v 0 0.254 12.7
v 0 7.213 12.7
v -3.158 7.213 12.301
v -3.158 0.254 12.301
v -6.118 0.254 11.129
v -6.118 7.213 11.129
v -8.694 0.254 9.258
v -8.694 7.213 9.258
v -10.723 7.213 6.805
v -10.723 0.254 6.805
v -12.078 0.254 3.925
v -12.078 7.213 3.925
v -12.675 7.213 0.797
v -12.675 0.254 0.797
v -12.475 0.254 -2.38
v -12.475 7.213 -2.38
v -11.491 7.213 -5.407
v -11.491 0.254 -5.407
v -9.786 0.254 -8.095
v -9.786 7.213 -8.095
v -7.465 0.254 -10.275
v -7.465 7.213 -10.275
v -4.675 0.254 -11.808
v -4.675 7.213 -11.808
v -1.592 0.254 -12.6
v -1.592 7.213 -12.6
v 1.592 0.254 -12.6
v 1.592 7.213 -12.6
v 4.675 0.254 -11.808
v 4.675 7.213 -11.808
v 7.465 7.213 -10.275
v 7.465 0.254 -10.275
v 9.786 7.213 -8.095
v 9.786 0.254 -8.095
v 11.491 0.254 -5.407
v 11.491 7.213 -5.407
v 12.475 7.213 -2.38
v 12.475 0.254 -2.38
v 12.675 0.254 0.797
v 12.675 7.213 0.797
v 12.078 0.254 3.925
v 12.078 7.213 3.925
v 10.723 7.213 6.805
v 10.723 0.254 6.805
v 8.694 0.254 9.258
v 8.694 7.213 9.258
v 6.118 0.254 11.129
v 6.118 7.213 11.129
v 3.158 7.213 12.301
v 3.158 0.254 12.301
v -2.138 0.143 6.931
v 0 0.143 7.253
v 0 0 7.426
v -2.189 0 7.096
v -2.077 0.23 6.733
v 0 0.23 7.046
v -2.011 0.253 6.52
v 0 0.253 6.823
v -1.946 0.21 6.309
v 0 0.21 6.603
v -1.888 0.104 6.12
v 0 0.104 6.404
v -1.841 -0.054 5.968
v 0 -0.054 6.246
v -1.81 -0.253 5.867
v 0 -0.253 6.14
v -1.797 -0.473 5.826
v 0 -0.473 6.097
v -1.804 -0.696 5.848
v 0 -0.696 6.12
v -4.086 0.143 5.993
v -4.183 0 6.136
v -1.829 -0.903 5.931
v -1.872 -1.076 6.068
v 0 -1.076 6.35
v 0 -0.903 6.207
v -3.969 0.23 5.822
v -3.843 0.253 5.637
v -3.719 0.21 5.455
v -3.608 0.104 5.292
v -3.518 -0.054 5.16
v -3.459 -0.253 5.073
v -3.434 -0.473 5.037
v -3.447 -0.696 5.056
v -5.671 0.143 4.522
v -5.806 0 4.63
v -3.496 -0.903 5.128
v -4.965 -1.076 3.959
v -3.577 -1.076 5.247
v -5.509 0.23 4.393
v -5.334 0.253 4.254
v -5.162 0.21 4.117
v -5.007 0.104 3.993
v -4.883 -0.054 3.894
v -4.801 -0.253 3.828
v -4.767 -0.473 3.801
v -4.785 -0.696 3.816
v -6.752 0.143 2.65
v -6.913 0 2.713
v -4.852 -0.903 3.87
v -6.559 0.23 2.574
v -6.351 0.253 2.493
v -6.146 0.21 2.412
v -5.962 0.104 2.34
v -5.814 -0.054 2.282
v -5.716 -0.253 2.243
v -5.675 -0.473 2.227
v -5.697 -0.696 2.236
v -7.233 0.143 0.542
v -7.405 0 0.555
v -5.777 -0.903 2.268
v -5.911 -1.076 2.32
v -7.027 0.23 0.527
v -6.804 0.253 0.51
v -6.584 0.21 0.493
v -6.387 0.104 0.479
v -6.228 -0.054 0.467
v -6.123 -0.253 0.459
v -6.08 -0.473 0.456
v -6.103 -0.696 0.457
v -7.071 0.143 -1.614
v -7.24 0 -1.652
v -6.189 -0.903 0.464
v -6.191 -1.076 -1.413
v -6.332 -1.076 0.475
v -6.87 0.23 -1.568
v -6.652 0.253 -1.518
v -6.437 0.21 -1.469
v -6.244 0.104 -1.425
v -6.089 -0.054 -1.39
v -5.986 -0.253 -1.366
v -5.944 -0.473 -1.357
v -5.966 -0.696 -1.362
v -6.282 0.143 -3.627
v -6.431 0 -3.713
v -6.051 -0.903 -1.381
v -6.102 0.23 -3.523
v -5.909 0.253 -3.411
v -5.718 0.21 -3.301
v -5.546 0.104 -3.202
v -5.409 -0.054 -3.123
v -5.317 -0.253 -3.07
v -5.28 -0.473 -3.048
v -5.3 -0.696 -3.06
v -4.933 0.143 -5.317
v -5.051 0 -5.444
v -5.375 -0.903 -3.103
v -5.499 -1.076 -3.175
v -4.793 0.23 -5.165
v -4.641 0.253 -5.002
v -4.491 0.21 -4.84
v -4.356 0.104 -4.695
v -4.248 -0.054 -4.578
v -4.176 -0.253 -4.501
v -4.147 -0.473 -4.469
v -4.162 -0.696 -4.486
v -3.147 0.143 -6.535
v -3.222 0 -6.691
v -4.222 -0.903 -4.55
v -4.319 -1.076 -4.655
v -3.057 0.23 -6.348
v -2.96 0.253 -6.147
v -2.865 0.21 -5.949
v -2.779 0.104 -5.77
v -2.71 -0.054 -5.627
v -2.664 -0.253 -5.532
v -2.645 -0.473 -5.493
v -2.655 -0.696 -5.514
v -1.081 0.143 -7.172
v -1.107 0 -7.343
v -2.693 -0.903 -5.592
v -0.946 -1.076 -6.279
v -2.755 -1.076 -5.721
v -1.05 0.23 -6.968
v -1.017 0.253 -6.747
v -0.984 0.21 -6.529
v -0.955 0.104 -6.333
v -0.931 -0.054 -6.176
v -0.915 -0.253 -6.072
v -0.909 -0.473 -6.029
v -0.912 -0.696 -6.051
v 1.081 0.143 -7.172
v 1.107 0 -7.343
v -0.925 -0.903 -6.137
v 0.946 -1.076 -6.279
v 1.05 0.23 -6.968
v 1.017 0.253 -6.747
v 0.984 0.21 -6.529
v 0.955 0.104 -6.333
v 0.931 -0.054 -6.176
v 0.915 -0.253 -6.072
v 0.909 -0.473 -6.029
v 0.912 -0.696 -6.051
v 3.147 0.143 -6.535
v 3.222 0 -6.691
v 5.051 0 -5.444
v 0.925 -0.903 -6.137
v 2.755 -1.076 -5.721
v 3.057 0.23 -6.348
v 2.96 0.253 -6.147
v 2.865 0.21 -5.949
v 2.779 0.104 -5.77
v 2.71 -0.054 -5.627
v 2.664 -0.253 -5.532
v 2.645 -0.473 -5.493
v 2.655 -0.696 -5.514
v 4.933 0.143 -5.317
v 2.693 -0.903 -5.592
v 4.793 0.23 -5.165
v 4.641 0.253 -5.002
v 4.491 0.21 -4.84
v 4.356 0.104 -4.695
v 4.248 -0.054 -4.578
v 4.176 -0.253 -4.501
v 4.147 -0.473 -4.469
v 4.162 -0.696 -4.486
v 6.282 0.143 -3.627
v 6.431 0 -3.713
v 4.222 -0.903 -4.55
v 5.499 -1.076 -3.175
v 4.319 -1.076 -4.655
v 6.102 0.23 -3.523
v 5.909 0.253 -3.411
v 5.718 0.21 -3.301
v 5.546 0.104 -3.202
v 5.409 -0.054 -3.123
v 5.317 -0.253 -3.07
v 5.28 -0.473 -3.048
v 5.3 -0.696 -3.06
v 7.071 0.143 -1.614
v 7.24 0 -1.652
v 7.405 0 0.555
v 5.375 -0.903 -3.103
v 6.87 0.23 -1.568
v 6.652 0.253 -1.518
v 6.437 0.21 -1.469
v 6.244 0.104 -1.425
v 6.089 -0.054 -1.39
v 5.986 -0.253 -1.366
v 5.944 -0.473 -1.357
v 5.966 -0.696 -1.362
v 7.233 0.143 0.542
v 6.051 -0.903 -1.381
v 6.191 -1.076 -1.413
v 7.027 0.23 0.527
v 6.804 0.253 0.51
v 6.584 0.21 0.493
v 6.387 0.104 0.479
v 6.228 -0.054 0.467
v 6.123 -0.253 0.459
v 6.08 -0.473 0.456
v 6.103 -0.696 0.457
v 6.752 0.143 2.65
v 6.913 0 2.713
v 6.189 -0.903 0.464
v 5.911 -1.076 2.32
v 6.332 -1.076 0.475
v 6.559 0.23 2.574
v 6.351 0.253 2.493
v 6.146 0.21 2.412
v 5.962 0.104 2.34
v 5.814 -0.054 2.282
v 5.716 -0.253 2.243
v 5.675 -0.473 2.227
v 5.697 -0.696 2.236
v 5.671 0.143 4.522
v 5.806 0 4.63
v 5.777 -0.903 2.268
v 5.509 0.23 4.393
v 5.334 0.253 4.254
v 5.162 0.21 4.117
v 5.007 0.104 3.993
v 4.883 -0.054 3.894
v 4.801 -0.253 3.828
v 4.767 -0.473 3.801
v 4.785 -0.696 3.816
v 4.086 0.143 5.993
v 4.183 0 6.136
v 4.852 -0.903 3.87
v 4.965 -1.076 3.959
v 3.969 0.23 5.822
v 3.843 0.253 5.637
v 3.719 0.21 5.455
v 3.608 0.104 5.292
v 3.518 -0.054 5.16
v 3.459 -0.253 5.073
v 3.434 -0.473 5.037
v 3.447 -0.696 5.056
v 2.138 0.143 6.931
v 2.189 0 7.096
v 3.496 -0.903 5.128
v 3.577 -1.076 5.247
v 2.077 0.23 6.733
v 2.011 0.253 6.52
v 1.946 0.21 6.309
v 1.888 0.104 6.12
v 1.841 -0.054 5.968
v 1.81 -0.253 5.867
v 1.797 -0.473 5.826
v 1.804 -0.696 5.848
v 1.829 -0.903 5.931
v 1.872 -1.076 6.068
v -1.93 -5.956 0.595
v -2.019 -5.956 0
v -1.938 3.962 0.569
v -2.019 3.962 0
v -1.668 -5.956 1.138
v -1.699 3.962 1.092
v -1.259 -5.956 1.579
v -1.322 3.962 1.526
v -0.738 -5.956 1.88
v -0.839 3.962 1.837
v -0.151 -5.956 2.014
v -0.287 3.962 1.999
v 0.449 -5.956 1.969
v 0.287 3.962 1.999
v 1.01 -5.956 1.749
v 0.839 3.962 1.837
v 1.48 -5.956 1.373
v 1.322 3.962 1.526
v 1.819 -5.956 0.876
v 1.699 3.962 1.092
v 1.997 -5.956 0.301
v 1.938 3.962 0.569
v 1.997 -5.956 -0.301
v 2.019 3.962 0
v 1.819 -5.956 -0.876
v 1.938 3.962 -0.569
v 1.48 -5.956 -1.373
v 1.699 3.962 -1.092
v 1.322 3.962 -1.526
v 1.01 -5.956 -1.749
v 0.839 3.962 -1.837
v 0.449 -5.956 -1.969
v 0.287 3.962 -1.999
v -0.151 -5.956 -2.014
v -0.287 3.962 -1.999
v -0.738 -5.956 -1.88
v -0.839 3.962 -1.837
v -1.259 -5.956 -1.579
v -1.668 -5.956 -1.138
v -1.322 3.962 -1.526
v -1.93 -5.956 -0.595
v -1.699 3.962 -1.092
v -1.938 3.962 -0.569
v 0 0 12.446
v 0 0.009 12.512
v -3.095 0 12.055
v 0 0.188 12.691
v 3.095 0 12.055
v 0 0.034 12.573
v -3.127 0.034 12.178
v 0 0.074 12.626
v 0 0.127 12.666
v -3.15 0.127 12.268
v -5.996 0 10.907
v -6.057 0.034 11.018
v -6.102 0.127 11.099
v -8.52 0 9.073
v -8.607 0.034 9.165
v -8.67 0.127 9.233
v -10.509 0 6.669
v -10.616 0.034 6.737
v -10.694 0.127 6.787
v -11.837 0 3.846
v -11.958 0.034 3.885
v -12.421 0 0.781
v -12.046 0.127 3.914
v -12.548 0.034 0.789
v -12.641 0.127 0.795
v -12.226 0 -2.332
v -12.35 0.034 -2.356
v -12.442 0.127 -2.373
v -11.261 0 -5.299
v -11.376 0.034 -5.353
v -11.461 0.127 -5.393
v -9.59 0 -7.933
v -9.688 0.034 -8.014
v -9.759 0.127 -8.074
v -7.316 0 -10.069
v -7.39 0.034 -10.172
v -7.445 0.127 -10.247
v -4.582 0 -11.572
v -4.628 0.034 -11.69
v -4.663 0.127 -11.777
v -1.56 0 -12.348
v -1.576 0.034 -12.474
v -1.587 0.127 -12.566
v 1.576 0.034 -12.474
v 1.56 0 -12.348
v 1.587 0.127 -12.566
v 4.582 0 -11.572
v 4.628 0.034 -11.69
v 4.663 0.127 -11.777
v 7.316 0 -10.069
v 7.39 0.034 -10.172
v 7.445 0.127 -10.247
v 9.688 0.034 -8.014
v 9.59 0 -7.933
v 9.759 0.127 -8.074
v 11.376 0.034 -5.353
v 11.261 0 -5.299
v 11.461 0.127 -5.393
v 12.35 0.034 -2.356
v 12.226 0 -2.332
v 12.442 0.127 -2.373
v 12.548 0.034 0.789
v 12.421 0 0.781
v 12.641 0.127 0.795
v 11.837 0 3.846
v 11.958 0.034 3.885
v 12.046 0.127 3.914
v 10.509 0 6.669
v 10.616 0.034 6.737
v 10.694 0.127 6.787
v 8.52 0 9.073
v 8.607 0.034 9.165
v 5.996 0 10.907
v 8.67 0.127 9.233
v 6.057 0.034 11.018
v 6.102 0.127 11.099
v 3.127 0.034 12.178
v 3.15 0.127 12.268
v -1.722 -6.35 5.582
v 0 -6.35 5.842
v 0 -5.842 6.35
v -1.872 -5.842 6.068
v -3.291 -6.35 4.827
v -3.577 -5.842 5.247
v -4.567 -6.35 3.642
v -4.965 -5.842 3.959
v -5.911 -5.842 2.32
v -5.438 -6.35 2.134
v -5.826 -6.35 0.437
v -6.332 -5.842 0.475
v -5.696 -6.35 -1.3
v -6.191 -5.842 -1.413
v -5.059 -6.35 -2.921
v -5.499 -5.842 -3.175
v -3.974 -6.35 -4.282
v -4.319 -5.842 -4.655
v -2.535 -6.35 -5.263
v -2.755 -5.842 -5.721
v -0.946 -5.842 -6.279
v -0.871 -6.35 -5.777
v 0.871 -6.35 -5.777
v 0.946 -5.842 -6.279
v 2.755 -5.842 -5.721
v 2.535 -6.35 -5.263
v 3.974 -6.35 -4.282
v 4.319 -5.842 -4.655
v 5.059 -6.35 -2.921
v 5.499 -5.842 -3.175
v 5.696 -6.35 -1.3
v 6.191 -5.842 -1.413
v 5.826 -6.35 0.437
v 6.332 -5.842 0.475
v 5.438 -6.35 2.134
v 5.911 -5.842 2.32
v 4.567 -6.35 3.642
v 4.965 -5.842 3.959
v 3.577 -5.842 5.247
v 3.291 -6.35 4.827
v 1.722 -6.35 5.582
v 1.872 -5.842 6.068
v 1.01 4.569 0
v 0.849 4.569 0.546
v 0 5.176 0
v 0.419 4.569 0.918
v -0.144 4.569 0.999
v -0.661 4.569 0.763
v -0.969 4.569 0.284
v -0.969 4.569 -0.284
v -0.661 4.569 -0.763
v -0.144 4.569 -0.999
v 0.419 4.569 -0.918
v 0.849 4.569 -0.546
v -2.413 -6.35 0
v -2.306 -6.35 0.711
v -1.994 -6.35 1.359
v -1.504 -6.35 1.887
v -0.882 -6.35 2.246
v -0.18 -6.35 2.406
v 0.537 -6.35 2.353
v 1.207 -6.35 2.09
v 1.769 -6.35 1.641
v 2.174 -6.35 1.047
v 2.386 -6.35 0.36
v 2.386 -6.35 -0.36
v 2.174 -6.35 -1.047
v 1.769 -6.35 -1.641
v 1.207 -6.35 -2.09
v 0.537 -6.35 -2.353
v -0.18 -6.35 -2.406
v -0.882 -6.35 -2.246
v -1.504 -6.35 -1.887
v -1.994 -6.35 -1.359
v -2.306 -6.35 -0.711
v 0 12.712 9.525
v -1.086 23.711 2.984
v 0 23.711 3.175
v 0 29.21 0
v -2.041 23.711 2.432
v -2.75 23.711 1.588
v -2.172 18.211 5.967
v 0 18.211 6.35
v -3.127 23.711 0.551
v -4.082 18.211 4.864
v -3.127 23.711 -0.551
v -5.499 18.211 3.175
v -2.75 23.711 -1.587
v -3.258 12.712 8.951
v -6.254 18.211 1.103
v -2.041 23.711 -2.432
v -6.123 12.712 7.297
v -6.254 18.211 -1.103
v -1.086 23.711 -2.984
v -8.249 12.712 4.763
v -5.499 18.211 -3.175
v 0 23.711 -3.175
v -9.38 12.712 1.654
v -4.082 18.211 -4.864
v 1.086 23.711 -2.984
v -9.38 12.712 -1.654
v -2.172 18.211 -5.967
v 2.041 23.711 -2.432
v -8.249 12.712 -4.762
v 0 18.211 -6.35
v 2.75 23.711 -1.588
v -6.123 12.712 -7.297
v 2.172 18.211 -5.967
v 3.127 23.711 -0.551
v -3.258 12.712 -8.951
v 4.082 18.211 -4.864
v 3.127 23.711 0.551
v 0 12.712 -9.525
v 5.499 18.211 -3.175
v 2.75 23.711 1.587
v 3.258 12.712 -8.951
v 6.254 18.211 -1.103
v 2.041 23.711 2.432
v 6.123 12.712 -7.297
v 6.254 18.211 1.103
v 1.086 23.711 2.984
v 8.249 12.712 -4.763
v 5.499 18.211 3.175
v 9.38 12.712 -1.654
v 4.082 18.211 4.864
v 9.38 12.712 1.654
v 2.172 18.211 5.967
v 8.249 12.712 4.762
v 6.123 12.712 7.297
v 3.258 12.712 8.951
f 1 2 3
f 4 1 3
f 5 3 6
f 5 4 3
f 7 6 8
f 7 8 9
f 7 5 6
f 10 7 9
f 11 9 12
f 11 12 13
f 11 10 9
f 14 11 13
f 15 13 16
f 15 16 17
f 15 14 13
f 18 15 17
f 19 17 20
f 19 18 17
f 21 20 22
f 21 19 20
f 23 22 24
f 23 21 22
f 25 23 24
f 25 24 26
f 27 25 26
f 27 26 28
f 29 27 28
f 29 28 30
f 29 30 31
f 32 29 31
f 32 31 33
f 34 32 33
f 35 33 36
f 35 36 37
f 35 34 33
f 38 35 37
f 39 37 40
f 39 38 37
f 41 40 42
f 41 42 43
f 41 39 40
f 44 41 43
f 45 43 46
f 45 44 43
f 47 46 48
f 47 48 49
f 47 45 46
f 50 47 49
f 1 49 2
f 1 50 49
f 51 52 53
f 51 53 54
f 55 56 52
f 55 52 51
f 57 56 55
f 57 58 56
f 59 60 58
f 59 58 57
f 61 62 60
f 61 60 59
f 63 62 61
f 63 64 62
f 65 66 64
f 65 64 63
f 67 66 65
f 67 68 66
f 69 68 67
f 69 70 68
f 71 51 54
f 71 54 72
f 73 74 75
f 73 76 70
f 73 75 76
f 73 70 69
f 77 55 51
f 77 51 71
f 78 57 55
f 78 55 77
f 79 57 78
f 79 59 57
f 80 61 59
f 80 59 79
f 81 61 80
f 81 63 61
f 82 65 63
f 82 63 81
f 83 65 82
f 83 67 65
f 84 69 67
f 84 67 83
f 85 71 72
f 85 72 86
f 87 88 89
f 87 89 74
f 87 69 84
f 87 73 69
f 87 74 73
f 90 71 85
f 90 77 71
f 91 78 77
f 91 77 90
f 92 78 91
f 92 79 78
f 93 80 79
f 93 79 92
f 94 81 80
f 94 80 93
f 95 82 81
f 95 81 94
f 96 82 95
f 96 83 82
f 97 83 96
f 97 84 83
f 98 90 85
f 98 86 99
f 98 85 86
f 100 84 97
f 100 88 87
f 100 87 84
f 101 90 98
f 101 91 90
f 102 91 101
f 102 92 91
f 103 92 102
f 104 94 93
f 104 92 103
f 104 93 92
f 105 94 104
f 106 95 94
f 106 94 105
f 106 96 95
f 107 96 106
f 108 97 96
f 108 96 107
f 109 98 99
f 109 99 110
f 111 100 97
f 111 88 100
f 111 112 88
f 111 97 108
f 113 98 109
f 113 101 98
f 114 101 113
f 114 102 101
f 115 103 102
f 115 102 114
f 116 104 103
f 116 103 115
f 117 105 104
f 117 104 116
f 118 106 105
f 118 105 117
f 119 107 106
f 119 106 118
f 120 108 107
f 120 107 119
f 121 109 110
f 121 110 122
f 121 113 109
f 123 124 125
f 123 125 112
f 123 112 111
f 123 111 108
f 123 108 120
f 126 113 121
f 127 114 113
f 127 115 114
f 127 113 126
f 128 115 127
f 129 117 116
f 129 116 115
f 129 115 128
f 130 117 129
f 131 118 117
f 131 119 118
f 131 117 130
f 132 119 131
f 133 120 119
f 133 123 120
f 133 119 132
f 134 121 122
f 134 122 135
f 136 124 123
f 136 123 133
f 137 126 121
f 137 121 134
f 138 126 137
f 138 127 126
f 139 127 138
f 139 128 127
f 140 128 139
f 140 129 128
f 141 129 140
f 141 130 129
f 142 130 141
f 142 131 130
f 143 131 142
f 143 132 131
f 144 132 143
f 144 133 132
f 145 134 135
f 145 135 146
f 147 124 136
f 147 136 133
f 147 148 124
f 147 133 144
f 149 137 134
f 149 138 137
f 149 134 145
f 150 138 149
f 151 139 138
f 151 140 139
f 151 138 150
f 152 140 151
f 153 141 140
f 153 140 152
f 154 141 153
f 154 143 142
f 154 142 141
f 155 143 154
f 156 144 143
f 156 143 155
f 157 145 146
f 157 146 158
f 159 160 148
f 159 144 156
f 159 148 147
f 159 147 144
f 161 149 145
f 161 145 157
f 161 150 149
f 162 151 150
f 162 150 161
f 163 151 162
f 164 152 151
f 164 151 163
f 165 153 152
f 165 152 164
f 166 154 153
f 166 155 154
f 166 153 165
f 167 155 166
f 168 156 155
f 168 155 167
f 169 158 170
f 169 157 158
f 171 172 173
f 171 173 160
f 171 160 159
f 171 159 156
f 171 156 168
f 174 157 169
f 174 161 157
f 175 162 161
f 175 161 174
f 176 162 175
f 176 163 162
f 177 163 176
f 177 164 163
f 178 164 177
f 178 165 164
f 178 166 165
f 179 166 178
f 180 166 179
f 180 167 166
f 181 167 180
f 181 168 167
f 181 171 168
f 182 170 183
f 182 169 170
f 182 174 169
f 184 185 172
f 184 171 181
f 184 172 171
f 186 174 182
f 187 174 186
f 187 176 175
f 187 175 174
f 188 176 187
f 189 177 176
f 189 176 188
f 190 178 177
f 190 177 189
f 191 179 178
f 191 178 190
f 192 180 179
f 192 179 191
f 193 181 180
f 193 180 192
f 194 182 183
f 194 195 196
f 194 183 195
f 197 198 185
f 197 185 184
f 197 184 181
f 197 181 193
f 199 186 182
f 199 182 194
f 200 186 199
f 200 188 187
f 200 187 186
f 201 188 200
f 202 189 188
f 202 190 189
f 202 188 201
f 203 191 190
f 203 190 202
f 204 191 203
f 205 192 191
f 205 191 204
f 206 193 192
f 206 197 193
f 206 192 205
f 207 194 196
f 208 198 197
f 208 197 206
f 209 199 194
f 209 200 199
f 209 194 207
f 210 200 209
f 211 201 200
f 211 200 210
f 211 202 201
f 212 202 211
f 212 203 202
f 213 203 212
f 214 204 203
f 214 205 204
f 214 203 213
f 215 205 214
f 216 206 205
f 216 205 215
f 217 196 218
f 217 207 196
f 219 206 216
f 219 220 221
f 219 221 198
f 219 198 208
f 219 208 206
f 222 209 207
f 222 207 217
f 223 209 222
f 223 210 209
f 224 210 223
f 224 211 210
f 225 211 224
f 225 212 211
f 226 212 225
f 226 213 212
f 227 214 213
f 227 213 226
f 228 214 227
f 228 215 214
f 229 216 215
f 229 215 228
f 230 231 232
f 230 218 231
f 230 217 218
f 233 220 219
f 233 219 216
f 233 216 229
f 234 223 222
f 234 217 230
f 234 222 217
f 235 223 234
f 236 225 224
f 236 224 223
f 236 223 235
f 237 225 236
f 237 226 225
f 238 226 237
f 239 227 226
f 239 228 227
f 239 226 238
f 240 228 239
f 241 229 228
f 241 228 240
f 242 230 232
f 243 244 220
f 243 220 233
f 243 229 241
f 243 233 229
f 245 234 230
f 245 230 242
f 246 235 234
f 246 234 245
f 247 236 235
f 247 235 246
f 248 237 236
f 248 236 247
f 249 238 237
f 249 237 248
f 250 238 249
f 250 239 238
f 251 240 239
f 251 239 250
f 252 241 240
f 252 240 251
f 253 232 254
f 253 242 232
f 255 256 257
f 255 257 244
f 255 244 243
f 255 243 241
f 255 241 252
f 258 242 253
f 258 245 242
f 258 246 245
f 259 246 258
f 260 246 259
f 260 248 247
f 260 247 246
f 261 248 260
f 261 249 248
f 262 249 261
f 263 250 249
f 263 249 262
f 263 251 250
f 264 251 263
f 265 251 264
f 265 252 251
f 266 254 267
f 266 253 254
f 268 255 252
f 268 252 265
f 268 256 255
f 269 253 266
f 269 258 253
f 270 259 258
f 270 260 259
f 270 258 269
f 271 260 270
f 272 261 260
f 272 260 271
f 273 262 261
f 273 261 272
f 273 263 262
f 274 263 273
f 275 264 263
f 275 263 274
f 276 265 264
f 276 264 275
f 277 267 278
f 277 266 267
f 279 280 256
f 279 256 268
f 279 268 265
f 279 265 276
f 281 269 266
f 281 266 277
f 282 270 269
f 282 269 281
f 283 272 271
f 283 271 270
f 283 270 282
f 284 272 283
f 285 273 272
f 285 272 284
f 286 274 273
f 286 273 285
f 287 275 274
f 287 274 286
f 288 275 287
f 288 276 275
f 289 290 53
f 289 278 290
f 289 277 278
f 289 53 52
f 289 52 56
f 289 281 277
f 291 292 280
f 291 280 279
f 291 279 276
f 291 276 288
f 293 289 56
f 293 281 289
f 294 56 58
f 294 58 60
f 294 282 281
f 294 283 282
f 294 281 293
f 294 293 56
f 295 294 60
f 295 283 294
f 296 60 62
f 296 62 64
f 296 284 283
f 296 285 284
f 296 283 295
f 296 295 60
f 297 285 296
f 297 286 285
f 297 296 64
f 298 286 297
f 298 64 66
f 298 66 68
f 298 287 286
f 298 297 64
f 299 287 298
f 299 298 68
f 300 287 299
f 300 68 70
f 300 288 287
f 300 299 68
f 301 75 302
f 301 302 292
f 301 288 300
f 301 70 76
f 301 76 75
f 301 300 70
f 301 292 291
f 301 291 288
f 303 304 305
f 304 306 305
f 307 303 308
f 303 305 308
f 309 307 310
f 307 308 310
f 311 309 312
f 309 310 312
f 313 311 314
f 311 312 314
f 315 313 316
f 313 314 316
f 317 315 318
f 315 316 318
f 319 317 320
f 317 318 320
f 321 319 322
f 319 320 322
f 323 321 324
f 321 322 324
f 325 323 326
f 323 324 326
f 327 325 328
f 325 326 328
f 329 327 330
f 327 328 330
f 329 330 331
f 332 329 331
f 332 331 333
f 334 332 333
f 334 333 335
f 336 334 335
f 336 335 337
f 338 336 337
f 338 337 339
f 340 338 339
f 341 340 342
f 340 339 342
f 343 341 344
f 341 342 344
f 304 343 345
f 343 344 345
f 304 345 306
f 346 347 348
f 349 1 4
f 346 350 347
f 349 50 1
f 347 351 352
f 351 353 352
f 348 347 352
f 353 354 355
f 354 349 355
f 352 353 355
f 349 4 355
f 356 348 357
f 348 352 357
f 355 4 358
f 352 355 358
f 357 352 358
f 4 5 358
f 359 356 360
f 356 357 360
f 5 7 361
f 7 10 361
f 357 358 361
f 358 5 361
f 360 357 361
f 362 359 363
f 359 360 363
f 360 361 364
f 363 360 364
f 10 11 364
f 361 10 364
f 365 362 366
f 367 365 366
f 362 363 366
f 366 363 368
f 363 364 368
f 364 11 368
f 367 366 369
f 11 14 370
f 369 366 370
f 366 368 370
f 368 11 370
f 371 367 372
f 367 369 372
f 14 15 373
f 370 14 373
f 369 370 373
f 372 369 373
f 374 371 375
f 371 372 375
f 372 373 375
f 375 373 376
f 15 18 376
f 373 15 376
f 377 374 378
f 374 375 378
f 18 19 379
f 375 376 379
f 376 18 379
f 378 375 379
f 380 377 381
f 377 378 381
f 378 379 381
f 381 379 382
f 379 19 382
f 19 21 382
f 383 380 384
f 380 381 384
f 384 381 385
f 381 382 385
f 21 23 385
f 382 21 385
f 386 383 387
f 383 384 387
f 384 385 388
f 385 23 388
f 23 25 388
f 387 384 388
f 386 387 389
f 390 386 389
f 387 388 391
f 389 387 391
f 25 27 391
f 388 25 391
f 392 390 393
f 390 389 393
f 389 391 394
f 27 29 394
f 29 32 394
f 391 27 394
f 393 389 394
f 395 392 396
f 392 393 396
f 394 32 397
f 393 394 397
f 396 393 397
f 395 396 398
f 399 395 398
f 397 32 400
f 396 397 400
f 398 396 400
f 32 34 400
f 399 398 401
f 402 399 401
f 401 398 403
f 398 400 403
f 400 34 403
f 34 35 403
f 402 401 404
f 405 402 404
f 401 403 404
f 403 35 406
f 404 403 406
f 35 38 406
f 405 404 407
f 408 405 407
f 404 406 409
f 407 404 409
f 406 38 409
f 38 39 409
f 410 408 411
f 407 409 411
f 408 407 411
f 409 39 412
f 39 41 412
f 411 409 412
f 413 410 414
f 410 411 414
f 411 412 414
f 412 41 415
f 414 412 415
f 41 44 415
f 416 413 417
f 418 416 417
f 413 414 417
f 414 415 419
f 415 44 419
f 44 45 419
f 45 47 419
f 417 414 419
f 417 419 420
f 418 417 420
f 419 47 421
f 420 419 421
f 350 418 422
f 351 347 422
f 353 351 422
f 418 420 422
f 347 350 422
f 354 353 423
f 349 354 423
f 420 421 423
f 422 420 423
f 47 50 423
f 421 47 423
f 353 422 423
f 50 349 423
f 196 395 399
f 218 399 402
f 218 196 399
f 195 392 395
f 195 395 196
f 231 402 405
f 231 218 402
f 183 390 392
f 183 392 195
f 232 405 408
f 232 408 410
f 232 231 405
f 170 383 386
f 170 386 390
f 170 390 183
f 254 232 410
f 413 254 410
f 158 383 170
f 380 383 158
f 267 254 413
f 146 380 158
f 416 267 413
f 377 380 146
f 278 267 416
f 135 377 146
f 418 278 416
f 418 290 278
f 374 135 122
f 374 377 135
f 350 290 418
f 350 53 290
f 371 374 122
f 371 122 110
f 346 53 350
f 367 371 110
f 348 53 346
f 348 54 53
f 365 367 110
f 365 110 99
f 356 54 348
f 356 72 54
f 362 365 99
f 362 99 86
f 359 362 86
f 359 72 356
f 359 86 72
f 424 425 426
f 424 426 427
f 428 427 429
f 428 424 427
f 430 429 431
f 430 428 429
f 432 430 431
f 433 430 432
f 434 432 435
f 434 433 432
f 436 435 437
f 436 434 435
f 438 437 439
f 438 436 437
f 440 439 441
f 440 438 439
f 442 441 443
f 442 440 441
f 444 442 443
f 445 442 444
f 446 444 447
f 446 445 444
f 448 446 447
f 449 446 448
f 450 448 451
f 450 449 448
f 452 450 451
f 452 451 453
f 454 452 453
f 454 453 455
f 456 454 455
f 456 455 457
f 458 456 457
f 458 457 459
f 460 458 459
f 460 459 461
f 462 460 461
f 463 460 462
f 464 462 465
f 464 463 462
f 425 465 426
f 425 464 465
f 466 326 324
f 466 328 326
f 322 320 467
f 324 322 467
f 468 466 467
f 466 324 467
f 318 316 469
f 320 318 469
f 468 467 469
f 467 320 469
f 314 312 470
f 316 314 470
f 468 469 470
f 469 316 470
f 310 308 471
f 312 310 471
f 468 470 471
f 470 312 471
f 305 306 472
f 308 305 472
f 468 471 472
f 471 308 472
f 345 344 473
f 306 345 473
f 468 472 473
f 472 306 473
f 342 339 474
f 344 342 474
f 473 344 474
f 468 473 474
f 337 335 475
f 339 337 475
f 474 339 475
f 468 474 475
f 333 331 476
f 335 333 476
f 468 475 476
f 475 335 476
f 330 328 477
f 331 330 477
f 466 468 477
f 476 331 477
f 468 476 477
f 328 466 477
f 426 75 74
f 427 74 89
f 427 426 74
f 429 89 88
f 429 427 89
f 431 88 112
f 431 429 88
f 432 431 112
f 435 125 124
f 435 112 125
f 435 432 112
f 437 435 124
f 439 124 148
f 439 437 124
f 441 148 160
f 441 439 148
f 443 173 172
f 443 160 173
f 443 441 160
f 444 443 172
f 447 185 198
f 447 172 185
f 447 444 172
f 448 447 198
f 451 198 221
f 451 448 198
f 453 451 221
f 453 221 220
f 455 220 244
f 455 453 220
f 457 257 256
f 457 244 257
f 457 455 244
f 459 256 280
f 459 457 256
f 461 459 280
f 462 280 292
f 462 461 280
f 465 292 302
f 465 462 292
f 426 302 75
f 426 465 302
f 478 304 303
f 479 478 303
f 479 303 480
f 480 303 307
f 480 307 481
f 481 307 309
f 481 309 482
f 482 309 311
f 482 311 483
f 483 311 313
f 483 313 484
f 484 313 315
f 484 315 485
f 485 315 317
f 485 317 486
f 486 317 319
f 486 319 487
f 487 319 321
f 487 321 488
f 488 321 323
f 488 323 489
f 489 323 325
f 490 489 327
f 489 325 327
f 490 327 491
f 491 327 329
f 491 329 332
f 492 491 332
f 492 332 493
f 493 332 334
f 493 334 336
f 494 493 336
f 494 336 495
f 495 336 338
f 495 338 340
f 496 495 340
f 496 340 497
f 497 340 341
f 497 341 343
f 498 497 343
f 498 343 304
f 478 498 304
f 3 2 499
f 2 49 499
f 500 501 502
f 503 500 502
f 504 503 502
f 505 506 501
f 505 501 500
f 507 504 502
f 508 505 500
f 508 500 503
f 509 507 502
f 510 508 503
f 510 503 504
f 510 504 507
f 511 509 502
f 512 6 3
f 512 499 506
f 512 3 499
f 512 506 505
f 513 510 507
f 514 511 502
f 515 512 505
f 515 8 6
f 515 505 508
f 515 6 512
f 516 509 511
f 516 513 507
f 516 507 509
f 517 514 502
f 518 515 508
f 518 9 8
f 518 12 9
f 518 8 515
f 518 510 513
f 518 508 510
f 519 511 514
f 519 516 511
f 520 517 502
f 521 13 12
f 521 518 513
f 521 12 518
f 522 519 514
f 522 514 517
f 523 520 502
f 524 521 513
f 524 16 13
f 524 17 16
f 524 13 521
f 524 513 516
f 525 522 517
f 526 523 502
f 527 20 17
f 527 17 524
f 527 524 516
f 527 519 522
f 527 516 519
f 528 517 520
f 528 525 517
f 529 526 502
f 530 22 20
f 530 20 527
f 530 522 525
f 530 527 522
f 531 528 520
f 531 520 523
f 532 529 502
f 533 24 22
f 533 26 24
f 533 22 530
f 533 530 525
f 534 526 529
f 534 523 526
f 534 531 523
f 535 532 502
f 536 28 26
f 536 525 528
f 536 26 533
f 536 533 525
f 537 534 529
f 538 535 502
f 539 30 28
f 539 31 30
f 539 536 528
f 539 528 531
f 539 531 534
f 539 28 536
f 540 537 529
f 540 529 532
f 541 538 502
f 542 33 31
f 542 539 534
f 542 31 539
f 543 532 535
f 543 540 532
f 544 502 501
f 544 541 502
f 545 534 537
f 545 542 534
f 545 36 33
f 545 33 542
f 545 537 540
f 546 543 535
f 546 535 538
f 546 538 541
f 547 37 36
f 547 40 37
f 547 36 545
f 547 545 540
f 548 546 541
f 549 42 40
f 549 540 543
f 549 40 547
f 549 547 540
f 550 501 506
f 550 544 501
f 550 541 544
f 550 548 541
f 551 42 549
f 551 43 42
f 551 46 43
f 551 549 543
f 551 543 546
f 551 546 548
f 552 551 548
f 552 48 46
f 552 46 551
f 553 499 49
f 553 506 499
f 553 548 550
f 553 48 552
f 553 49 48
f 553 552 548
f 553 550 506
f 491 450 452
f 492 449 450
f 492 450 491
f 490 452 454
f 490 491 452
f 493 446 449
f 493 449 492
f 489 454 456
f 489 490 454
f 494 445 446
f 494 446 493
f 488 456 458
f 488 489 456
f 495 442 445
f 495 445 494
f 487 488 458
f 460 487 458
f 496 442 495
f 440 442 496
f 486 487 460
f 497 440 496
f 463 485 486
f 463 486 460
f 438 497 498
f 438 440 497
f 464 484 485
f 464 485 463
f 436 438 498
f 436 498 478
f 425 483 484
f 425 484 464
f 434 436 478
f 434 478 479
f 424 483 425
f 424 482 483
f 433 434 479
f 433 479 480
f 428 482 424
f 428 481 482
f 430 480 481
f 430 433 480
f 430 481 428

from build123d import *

# Parameters (mm, degrees)
SKETCH2_R                        = 0.762
CHAMFER1_SIZE                    = 0.508
FILLET1_R                        = 0.254
F_10_32_TAPPED_HOLE1_D           = 4.0386
F_10_32_TAPPED_HOLE1_DEPTH       = 10.3124
F_10_32_TAPPED_HOLE1_CSINK_D     = 4.826
F_10_32_TAPPED_HOLE1_CSINK_ANGLE = 90
F_10_32_TAPPED_HOLE1_TIP         = 1.213317848


with BuildPart() as part:
    # Sketch1 → Revolve1 (revolve)
    with BuildSketch(Plane.XY, mode=Mode.PRIVATE) as revolve1_sk:
        Polygon((12.7, 0), (6.35, 0), (6.35, -6.35), (0, -6.35), (0, 29.21), (12.7, 7.212954744), align=None)
    revolve(revolve1_sk.sketch.rotate(Axis((0, 35.289344262, 0), (0, -1, 0)), 90), axis=Axis((0, 35.289344262, 0), (0, -1, 0)))  # turned: the seam where the file's is

    # Sketch2 → Cut-Revolve1 (revolve, cut)
    with BuildSketch(Plane.XY, mode=Mode.PRIVATE) as cut_revolve1_sk:
        with Locations((6.858, -0.508)):
            Circle(SKETCH2_R)
    revolve(cut_revolve1_sk.sketch.rotate(Axis((0, 0, 0), (0, -1, 0)), 90), axis=Axis((0, 0, 0), (0, -1, 0)), mode=Mode.SUBTRACT)  # turned: the seam where the file's is

    # Chamfer1
    chamfer1_edges = [part.edges().sort_by_distance(p)[0] for p in [
        (0, -6.35, -6.35),
    ]]
    chamfer(chamfer1_edges, length=CHAMFER1_SIZE)

    # Fillet1
    fillet1_edges = [part.edges().sort_by_distance(p)[0] for p in [
        (0, 0, -12.7),
    ]]
    fillet(fillet1_edges, radius=FILLET1_R)

    # 10-32 Tapped Hole1
    with Locations(Plane.XZ.offset(6.35)):
        with Locations((0, 0)):
            CounterSinkHole(F_10_32_TAPPED_HOLE1_D / 2, F_10_32_TAPPED_HOLE1_CSINK_D / 2, depth=F_10_32_TAPPED_HOLE1_DEPTH, counter_sink_angle=F_10_32_TAPPED_HOLE1_CSINK_ANGLE)
            with Locations((0, 0, -(F_10_32_TAPPED_HOLE1_DEPTH + F_10_32_TAPPED_HOLE1_TIP / 2))):  # 118° drill point
                Cone(0, F_10_32_TAPPED_HOLE1_D / 2, F_10_32_TAPPED_HOLE1_TIP, mode=Mode.SUBTRACT)


solid = part.part
